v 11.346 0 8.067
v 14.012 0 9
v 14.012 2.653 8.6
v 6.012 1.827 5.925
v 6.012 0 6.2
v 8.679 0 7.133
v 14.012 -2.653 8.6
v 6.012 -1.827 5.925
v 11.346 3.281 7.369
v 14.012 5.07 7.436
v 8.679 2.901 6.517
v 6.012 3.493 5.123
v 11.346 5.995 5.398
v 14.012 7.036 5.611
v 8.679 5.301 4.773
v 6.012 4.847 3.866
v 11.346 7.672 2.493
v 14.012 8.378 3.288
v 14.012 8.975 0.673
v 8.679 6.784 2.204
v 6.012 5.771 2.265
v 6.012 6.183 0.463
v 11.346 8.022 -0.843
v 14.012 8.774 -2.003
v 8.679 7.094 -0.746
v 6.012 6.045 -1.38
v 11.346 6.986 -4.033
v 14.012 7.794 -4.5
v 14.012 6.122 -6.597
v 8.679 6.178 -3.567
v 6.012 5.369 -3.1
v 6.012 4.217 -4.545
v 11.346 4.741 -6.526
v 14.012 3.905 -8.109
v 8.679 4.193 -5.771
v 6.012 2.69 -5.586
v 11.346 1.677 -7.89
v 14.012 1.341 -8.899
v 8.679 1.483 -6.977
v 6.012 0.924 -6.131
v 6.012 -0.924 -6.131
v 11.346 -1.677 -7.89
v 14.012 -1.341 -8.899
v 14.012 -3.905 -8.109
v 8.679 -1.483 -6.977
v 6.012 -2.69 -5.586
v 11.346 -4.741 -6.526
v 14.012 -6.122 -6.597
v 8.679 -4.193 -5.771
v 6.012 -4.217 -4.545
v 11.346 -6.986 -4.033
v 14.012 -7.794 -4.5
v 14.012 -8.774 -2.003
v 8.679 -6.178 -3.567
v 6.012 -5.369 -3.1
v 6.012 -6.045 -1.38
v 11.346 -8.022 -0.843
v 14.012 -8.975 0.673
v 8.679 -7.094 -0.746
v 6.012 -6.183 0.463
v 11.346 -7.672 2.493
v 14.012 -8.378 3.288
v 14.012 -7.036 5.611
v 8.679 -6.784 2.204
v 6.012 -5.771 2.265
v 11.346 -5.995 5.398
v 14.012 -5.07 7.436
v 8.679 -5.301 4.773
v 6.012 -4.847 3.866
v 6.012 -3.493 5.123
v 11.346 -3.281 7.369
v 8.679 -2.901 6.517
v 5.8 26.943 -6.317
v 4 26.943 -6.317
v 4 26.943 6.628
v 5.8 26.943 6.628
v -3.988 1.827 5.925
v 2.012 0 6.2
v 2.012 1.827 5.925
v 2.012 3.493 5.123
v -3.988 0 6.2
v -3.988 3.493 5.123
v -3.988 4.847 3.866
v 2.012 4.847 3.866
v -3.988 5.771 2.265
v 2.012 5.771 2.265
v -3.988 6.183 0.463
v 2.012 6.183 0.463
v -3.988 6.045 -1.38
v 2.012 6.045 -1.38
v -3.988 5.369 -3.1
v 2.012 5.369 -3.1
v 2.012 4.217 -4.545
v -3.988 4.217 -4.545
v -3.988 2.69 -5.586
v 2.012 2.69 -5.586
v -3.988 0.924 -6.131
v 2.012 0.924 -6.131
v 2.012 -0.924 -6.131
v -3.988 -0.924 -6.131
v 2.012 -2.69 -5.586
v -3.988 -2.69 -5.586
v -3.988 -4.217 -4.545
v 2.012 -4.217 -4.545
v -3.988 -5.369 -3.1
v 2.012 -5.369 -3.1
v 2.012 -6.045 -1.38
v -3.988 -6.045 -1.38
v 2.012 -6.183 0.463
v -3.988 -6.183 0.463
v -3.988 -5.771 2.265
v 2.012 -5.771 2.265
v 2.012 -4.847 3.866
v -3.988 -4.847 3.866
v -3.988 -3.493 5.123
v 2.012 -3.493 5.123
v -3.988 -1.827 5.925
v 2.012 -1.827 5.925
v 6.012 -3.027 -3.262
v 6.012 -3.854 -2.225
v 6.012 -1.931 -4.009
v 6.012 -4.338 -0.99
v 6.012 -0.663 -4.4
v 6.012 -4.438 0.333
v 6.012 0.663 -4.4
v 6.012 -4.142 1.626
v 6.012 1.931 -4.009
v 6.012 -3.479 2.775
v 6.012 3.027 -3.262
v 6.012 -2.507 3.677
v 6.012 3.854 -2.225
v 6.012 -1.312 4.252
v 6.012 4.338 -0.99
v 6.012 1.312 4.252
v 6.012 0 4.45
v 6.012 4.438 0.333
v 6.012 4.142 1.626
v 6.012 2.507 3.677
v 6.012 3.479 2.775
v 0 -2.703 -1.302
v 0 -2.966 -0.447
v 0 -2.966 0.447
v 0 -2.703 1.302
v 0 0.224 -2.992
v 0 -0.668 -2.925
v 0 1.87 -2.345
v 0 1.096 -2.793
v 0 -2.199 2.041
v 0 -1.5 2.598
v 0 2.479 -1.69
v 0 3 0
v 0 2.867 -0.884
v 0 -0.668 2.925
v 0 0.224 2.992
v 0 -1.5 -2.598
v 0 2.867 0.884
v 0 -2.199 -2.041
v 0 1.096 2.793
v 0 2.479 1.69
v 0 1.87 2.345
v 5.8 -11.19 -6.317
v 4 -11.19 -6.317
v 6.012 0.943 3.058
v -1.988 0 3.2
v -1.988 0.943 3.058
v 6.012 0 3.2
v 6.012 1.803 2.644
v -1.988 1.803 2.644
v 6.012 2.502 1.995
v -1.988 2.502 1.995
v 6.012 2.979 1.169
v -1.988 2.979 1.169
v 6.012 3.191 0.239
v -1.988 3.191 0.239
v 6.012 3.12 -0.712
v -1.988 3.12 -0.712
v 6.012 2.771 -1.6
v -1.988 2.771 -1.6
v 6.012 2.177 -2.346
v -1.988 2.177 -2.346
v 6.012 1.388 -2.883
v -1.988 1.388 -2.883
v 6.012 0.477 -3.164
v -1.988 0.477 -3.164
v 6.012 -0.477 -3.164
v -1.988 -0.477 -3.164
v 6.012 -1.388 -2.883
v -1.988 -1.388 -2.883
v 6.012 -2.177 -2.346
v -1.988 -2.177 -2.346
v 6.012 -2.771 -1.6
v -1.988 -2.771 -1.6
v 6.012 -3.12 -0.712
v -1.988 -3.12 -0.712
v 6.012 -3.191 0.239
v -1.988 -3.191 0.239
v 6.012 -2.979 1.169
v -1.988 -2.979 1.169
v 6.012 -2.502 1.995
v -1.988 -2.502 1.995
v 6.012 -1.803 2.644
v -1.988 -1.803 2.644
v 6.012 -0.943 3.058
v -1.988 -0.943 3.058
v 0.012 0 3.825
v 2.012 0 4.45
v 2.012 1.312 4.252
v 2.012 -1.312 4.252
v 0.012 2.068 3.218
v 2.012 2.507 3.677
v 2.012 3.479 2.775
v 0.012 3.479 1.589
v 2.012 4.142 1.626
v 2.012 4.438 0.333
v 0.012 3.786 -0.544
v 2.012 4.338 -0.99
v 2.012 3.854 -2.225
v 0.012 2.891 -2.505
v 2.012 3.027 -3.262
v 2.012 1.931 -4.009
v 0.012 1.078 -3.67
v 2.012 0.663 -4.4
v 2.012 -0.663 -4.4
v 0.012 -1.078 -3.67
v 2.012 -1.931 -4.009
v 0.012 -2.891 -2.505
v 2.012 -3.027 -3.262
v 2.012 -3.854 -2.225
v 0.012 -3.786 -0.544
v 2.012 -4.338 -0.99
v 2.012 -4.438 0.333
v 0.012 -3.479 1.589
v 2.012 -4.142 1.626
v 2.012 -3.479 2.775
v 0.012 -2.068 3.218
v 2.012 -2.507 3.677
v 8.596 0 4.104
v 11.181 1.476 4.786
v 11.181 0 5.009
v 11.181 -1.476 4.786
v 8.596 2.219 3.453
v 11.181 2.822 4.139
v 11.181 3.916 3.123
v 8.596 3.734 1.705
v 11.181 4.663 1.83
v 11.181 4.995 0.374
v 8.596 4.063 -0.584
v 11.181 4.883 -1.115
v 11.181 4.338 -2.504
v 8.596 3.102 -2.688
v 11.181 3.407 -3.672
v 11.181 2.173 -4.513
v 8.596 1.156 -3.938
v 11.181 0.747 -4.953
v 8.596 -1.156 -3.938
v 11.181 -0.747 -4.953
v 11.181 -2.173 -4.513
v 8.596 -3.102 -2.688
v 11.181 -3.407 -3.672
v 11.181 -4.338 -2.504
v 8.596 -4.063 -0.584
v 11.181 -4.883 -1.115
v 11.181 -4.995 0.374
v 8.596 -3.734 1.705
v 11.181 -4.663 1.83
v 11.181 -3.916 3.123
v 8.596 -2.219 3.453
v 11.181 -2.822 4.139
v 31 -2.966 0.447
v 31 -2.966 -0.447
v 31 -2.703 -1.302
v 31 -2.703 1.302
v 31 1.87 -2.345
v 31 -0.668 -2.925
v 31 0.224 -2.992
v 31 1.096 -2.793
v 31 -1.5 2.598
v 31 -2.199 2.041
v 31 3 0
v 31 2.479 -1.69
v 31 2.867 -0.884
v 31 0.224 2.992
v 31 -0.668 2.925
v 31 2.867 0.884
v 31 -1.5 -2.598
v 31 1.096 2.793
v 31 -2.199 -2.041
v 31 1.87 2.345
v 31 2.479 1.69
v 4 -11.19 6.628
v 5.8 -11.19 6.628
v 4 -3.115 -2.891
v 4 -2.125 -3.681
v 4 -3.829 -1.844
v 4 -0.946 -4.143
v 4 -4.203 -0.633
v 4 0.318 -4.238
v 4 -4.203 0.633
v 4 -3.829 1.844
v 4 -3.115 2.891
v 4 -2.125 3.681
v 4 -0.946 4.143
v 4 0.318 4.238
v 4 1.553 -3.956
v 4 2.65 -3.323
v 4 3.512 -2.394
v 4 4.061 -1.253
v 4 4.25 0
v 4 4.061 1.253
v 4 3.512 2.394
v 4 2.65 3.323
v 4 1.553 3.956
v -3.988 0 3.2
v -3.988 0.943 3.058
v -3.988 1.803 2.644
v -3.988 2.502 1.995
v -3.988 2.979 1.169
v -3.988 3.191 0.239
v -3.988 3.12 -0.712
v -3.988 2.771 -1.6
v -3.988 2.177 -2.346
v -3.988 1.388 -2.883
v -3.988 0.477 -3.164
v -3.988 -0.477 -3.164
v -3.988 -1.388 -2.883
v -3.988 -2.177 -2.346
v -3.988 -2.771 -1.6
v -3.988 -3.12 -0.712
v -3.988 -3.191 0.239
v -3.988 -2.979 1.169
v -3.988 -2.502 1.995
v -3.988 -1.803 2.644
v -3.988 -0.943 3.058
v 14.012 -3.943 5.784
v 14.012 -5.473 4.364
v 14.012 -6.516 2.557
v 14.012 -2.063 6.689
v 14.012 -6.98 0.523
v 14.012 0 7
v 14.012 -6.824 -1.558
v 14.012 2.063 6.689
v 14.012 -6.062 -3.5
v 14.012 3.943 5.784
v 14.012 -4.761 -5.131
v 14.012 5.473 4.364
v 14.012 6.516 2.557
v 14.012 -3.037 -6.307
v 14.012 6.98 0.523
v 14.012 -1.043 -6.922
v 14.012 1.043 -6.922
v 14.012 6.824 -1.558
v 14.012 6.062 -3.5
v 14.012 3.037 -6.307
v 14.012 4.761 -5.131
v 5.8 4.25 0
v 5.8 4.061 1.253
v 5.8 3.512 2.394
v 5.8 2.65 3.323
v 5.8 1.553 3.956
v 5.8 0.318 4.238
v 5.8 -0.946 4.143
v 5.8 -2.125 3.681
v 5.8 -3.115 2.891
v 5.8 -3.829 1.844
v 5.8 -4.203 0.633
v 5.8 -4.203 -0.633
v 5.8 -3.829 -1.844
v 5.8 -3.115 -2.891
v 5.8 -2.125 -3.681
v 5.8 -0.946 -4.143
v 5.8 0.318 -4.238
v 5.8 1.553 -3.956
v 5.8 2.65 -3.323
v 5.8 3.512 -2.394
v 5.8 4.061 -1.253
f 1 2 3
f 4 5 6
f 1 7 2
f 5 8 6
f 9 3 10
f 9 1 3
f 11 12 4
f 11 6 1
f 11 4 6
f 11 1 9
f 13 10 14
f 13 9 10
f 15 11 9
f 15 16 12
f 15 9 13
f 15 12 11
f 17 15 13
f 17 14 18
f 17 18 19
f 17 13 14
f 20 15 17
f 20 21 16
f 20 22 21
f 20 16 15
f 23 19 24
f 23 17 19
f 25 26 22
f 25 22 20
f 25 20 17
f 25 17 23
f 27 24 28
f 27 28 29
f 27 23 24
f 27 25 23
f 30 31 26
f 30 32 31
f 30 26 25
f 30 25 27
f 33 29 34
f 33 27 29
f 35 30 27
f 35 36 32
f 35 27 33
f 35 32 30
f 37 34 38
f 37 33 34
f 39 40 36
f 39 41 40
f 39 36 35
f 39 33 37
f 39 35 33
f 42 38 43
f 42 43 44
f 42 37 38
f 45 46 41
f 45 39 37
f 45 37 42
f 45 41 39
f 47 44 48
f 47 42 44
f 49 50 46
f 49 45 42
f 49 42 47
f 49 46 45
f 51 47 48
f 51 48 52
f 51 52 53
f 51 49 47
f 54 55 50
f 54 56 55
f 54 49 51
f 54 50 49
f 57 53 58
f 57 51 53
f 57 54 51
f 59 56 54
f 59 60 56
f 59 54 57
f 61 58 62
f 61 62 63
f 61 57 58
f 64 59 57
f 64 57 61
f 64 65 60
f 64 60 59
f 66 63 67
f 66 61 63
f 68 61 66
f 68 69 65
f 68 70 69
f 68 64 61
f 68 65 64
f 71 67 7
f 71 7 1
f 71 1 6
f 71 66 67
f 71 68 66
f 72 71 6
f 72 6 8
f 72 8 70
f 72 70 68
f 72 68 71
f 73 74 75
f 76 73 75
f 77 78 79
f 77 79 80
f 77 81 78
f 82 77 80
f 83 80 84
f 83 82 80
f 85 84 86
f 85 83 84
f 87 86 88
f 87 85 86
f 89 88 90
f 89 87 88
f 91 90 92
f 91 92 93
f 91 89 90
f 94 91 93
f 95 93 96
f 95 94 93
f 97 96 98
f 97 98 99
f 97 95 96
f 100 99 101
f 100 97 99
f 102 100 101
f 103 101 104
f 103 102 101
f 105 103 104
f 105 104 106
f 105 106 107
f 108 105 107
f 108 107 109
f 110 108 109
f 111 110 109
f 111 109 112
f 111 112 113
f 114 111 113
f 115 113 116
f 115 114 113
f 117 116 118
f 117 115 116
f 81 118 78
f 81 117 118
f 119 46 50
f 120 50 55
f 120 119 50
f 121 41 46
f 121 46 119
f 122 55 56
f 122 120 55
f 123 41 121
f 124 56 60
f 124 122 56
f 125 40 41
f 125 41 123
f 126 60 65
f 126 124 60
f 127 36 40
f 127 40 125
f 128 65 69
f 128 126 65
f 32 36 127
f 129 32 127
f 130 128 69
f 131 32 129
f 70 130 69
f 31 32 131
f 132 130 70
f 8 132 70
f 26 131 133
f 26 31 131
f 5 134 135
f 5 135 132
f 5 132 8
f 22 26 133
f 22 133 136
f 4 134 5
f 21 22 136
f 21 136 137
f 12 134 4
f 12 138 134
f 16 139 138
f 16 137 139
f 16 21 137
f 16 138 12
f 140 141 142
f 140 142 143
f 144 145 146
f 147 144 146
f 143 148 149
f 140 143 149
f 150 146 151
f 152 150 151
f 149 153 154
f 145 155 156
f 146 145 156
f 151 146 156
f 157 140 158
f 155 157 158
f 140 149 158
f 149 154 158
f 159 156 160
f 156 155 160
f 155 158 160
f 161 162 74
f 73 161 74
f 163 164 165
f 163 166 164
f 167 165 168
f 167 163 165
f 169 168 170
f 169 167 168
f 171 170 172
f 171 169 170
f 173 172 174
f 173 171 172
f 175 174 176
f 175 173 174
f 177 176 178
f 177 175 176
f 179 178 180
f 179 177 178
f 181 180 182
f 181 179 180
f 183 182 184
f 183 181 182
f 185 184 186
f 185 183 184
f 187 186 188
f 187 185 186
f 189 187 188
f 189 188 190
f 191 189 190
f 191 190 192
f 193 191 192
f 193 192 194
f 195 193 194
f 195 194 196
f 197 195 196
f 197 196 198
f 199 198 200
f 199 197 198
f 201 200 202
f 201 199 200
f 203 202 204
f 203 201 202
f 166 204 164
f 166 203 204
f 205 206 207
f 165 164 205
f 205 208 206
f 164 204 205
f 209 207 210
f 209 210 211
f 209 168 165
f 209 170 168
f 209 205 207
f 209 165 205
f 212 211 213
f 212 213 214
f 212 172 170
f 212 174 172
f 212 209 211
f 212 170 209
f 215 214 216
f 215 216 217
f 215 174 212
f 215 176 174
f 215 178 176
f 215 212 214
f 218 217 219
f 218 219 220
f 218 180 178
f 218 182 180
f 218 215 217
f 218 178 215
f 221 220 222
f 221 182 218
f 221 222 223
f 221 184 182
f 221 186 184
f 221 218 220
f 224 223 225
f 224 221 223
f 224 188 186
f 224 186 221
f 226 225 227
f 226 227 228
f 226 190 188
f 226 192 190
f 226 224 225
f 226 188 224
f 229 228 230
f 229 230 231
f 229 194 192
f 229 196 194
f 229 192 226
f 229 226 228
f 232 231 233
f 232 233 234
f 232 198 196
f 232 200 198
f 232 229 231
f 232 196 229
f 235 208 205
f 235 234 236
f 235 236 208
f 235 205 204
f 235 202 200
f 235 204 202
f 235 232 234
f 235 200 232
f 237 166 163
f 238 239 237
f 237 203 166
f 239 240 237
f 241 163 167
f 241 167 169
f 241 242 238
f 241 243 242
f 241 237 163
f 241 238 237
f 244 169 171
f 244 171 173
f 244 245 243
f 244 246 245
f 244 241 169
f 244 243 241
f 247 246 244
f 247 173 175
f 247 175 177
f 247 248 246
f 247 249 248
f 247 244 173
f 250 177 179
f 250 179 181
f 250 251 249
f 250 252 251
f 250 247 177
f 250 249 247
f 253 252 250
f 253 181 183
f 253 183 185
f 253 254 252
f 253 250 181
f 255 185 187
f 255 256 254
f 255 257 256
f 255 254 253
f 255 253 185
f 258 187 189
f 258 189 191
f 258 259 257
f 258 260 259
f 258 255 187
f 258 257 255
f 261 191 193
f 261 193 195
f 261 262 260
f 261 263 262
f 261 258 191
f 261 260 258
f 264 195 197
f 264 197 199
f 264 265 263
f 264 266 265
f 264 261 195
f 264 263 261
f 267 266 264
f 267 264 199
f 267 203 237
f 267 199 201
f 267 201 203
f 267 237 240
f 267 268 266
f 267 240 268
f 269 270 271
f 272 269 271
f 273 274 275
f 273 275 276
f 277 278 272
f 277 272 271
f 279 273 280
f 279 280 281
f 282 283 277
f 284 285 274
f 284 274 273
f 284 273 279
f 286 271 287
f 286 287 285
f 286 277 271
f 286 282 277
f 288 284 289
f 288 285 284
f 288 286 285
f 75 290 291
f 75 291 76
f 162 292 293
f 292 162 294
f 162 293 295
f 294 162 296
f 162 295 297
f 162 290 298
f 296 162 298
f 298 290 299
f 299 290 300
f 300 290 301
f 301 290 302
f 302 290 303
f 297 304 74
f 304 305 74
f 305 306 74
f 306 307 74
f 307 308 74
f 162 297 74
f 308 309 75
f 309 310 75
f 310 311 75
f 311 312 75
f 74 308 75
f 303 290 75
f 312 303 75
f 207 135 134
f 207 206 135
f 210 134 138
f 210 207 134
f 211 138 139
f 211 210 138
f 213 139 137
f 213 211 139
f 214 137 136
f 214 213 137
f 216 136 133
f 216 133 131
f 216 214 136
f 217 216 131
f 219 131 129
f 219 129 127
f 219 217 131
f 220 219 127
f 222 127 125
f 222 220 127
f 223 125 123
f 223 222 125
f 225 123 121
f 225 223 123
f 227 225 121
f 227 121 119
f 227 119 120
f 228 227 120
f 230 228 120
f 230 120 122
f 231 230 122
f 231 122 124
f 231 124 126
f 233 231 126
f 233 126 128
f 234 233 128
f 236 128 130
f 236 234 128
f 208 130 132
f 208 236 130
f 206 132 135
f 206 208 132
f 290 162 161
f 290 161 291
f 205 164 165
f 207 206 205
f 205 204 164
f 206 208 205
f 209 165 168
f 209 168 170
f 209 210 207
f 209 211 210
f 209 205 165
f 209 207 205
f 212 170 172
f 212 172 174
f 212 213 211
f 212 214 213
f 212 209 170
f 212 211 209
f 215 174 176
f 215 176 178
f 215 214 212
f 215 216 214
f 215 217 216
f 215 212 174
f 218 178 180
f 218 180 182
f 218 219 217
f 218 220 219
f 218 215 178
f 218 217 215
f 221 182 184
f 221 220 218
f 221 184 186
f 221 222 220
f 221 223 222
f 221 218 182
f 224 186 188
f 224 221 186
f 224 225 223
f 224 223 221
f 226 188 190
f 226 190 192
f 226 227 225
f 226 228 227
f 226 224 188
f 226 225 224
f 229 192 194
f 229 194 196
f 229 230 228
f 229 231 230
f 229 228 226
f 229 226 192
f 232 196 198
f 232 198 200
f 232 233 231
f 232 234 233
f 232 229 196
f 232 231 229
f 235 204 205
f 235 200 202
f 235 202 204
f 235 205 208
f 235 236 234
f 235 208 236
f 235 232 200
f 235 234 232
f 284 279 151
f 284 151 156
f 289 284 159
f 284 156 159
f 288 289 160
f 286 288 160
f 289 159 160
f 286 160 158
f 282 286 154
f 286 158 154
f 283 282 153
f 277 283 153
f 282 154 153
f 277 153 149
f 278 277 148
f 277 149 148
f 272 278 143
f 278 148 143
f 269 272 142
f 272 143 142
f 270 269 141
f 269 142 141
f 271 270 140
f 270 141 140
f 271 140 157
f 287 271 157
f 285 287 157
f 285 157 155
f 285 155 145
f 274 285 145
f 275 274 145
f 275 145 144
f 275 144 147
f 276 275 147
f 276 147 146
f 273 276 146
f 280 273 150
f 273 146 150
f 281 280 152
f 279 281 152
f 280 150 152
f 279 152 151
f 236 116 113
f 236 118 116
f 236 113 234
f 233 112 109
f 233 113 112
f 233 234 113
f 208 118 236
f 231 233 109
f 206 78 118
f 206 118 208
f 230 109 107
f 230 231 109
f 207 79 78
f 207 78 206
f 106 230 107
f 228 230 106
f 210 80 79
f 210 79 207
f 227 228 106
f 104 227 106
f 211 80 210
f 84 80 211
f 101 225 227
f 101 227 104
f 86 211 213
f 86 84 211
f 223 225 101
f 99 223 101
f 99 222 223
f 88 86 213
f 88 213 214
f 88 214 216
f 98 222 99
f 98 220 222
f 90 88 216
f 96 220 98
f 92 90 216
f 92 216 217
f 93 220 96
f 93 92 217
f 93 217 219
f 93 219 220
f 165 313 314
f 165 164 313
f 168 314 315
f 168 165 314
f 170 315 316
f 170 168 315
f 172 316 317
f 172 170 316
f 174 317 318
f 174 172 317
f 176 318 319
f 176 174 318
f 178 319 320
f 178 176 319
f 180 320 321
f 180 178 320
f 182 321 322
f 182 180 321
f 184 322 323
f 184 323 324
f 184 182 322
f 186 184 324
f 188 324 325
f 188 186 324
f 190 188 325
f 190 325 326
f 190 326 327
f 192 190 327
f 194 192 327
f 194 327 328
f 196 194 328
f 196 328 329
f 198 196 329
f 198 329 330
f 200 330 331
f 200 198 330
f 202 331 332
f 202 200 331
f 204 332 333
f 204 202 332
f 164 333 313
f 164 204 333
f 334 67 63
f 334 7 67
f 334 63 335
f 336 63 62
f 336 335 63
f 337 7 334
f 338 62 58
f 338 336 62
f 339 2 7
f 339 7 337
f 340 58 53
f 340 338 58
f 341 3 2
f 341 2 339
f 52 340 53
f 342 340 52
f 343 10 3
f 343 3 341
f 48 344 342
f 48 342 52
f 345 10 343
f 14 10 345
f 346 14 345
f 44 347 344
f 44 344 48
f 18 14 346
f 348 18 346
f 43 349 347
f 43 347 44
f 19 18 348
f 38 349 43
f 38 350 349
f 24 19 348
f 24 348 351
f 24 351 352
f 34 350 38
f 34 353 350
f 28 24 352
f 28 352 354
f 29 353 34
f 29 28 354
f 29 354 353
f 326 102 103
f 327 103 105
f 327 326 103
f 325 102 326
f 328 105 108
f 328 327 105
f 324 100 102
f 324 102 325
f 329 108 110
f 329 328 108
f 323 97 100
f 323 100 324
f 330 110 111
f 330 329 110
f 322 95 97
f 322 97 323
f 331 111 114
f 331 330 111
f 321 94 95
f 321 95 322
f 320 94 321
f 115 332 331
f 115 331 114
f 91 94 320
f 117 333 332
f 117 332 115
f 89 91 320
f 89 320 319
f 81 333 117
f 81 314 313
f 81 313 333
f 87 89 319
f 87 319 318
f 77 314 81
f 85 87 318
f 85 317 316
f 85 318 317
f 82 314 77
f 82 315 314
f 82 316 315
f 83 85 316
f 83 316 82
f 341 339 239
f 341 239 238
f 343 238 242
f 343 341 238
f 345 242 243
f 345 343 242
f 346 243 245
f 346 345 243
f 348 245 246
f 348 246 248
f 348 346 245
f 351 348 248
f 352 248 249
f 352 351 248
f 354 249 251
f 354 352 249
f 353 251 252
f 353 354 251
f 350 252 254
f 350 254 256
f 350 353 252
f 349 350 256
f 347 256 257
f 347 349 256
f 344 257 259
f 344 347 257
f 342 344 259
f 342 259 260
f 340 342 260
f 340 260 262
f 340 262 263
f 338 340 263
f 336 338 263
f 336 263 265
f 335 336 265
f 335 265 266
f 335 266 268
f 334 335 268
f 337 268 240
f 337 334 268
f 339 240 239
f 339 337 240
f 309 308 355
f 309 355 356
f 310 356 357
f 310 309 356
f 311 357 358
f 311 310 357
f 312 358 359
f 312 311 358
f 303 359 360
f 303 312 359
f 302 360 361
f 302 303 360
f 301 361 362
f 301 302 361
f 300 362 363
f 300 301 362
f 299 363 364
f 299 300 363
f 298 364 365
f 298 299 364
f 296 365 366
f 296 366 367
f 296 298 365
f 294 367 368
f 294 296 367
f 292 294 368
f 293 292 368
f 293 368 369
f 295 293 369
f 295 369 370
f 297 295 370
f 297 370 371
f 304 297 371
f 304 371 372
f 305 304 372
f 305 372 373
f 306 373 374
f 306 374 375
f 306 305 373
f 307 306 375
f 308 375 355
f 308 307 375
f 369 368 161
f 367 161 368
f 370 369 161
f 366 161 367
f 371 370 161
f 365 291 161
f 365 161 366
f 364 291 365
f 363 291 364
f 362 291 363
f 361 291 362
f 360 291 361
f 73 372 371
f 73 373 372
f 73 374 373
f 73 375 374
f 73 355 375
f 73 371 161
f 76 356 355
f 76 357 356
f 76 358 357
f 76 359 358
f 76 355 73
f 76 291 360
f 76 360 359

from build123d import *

# Parameters (mm, degrees)
F0_R     = 3
F1_DEPTH = 31
F3_W     = 38.133026
F3_H     = 12.944954
F3_R     = 4.25
F4_DEPTH = 1.8
F7_SIZE2 = 1
F7_SIZE  = 3


with BuildPart() as f1:
    # F0 (on Right) → F1 (new body)
    with BuildSketch(Plane.YZ):
        Circle(F0_R)
    extrude(amount=F1_DEPTH)


with BuildPart() as f4:
    # F3 (on offset) → F4 (new body)
    with BuildSketch(Plane.YZ.offset(4)):
        with Locations((7.876146, 0.155963)):
            Rectangle(F3_W, F3_H)
        Circle(F3_R, mode=Mode.SUBTRACT)
    extrude(amount=F4_DEPTH)


with BuildPart() as f6:
    # F5 (on Front) → F6 (revolve)
    with BuildSketch(Plane.XZ):
        Polygon((6.012275, 3.2), (14.012275, 6), (14.012275, 9), (6.012275, 6.2), (6.012275, 4.45), (2.012275, 4.45), (-1.987725, 3.2), (-0.814473, 3.2), align=None)
    revolve(axis=Axis((7.006137, 0, 0), (-1, 0, 0)))

    # F7
    f7_edges = [f6.edges().sort_by_distance(p)[0] for p in [
        (14.012275, 0, -6),
    ]]
    chamfer(f7_edges, length=F7_SIZE, length2=F7_SIZE2)


with BuildPart() as f8:
    # F5 (on Front) → F8 (revolve)
    with BuildSketch(Plane.XZ):
        Polygon((-3.987725, 3.2), (-1.987725, 3.2), (2.012275, 4.45), (2.012275, 6.2), (-3.987725, 6.2), align=None)
    revolve(axis=Axis((7.006137, 0, 0), (-1, 0, 0)))


solid = Compound([f1.part, f4.part, f6.part, f8.part])
